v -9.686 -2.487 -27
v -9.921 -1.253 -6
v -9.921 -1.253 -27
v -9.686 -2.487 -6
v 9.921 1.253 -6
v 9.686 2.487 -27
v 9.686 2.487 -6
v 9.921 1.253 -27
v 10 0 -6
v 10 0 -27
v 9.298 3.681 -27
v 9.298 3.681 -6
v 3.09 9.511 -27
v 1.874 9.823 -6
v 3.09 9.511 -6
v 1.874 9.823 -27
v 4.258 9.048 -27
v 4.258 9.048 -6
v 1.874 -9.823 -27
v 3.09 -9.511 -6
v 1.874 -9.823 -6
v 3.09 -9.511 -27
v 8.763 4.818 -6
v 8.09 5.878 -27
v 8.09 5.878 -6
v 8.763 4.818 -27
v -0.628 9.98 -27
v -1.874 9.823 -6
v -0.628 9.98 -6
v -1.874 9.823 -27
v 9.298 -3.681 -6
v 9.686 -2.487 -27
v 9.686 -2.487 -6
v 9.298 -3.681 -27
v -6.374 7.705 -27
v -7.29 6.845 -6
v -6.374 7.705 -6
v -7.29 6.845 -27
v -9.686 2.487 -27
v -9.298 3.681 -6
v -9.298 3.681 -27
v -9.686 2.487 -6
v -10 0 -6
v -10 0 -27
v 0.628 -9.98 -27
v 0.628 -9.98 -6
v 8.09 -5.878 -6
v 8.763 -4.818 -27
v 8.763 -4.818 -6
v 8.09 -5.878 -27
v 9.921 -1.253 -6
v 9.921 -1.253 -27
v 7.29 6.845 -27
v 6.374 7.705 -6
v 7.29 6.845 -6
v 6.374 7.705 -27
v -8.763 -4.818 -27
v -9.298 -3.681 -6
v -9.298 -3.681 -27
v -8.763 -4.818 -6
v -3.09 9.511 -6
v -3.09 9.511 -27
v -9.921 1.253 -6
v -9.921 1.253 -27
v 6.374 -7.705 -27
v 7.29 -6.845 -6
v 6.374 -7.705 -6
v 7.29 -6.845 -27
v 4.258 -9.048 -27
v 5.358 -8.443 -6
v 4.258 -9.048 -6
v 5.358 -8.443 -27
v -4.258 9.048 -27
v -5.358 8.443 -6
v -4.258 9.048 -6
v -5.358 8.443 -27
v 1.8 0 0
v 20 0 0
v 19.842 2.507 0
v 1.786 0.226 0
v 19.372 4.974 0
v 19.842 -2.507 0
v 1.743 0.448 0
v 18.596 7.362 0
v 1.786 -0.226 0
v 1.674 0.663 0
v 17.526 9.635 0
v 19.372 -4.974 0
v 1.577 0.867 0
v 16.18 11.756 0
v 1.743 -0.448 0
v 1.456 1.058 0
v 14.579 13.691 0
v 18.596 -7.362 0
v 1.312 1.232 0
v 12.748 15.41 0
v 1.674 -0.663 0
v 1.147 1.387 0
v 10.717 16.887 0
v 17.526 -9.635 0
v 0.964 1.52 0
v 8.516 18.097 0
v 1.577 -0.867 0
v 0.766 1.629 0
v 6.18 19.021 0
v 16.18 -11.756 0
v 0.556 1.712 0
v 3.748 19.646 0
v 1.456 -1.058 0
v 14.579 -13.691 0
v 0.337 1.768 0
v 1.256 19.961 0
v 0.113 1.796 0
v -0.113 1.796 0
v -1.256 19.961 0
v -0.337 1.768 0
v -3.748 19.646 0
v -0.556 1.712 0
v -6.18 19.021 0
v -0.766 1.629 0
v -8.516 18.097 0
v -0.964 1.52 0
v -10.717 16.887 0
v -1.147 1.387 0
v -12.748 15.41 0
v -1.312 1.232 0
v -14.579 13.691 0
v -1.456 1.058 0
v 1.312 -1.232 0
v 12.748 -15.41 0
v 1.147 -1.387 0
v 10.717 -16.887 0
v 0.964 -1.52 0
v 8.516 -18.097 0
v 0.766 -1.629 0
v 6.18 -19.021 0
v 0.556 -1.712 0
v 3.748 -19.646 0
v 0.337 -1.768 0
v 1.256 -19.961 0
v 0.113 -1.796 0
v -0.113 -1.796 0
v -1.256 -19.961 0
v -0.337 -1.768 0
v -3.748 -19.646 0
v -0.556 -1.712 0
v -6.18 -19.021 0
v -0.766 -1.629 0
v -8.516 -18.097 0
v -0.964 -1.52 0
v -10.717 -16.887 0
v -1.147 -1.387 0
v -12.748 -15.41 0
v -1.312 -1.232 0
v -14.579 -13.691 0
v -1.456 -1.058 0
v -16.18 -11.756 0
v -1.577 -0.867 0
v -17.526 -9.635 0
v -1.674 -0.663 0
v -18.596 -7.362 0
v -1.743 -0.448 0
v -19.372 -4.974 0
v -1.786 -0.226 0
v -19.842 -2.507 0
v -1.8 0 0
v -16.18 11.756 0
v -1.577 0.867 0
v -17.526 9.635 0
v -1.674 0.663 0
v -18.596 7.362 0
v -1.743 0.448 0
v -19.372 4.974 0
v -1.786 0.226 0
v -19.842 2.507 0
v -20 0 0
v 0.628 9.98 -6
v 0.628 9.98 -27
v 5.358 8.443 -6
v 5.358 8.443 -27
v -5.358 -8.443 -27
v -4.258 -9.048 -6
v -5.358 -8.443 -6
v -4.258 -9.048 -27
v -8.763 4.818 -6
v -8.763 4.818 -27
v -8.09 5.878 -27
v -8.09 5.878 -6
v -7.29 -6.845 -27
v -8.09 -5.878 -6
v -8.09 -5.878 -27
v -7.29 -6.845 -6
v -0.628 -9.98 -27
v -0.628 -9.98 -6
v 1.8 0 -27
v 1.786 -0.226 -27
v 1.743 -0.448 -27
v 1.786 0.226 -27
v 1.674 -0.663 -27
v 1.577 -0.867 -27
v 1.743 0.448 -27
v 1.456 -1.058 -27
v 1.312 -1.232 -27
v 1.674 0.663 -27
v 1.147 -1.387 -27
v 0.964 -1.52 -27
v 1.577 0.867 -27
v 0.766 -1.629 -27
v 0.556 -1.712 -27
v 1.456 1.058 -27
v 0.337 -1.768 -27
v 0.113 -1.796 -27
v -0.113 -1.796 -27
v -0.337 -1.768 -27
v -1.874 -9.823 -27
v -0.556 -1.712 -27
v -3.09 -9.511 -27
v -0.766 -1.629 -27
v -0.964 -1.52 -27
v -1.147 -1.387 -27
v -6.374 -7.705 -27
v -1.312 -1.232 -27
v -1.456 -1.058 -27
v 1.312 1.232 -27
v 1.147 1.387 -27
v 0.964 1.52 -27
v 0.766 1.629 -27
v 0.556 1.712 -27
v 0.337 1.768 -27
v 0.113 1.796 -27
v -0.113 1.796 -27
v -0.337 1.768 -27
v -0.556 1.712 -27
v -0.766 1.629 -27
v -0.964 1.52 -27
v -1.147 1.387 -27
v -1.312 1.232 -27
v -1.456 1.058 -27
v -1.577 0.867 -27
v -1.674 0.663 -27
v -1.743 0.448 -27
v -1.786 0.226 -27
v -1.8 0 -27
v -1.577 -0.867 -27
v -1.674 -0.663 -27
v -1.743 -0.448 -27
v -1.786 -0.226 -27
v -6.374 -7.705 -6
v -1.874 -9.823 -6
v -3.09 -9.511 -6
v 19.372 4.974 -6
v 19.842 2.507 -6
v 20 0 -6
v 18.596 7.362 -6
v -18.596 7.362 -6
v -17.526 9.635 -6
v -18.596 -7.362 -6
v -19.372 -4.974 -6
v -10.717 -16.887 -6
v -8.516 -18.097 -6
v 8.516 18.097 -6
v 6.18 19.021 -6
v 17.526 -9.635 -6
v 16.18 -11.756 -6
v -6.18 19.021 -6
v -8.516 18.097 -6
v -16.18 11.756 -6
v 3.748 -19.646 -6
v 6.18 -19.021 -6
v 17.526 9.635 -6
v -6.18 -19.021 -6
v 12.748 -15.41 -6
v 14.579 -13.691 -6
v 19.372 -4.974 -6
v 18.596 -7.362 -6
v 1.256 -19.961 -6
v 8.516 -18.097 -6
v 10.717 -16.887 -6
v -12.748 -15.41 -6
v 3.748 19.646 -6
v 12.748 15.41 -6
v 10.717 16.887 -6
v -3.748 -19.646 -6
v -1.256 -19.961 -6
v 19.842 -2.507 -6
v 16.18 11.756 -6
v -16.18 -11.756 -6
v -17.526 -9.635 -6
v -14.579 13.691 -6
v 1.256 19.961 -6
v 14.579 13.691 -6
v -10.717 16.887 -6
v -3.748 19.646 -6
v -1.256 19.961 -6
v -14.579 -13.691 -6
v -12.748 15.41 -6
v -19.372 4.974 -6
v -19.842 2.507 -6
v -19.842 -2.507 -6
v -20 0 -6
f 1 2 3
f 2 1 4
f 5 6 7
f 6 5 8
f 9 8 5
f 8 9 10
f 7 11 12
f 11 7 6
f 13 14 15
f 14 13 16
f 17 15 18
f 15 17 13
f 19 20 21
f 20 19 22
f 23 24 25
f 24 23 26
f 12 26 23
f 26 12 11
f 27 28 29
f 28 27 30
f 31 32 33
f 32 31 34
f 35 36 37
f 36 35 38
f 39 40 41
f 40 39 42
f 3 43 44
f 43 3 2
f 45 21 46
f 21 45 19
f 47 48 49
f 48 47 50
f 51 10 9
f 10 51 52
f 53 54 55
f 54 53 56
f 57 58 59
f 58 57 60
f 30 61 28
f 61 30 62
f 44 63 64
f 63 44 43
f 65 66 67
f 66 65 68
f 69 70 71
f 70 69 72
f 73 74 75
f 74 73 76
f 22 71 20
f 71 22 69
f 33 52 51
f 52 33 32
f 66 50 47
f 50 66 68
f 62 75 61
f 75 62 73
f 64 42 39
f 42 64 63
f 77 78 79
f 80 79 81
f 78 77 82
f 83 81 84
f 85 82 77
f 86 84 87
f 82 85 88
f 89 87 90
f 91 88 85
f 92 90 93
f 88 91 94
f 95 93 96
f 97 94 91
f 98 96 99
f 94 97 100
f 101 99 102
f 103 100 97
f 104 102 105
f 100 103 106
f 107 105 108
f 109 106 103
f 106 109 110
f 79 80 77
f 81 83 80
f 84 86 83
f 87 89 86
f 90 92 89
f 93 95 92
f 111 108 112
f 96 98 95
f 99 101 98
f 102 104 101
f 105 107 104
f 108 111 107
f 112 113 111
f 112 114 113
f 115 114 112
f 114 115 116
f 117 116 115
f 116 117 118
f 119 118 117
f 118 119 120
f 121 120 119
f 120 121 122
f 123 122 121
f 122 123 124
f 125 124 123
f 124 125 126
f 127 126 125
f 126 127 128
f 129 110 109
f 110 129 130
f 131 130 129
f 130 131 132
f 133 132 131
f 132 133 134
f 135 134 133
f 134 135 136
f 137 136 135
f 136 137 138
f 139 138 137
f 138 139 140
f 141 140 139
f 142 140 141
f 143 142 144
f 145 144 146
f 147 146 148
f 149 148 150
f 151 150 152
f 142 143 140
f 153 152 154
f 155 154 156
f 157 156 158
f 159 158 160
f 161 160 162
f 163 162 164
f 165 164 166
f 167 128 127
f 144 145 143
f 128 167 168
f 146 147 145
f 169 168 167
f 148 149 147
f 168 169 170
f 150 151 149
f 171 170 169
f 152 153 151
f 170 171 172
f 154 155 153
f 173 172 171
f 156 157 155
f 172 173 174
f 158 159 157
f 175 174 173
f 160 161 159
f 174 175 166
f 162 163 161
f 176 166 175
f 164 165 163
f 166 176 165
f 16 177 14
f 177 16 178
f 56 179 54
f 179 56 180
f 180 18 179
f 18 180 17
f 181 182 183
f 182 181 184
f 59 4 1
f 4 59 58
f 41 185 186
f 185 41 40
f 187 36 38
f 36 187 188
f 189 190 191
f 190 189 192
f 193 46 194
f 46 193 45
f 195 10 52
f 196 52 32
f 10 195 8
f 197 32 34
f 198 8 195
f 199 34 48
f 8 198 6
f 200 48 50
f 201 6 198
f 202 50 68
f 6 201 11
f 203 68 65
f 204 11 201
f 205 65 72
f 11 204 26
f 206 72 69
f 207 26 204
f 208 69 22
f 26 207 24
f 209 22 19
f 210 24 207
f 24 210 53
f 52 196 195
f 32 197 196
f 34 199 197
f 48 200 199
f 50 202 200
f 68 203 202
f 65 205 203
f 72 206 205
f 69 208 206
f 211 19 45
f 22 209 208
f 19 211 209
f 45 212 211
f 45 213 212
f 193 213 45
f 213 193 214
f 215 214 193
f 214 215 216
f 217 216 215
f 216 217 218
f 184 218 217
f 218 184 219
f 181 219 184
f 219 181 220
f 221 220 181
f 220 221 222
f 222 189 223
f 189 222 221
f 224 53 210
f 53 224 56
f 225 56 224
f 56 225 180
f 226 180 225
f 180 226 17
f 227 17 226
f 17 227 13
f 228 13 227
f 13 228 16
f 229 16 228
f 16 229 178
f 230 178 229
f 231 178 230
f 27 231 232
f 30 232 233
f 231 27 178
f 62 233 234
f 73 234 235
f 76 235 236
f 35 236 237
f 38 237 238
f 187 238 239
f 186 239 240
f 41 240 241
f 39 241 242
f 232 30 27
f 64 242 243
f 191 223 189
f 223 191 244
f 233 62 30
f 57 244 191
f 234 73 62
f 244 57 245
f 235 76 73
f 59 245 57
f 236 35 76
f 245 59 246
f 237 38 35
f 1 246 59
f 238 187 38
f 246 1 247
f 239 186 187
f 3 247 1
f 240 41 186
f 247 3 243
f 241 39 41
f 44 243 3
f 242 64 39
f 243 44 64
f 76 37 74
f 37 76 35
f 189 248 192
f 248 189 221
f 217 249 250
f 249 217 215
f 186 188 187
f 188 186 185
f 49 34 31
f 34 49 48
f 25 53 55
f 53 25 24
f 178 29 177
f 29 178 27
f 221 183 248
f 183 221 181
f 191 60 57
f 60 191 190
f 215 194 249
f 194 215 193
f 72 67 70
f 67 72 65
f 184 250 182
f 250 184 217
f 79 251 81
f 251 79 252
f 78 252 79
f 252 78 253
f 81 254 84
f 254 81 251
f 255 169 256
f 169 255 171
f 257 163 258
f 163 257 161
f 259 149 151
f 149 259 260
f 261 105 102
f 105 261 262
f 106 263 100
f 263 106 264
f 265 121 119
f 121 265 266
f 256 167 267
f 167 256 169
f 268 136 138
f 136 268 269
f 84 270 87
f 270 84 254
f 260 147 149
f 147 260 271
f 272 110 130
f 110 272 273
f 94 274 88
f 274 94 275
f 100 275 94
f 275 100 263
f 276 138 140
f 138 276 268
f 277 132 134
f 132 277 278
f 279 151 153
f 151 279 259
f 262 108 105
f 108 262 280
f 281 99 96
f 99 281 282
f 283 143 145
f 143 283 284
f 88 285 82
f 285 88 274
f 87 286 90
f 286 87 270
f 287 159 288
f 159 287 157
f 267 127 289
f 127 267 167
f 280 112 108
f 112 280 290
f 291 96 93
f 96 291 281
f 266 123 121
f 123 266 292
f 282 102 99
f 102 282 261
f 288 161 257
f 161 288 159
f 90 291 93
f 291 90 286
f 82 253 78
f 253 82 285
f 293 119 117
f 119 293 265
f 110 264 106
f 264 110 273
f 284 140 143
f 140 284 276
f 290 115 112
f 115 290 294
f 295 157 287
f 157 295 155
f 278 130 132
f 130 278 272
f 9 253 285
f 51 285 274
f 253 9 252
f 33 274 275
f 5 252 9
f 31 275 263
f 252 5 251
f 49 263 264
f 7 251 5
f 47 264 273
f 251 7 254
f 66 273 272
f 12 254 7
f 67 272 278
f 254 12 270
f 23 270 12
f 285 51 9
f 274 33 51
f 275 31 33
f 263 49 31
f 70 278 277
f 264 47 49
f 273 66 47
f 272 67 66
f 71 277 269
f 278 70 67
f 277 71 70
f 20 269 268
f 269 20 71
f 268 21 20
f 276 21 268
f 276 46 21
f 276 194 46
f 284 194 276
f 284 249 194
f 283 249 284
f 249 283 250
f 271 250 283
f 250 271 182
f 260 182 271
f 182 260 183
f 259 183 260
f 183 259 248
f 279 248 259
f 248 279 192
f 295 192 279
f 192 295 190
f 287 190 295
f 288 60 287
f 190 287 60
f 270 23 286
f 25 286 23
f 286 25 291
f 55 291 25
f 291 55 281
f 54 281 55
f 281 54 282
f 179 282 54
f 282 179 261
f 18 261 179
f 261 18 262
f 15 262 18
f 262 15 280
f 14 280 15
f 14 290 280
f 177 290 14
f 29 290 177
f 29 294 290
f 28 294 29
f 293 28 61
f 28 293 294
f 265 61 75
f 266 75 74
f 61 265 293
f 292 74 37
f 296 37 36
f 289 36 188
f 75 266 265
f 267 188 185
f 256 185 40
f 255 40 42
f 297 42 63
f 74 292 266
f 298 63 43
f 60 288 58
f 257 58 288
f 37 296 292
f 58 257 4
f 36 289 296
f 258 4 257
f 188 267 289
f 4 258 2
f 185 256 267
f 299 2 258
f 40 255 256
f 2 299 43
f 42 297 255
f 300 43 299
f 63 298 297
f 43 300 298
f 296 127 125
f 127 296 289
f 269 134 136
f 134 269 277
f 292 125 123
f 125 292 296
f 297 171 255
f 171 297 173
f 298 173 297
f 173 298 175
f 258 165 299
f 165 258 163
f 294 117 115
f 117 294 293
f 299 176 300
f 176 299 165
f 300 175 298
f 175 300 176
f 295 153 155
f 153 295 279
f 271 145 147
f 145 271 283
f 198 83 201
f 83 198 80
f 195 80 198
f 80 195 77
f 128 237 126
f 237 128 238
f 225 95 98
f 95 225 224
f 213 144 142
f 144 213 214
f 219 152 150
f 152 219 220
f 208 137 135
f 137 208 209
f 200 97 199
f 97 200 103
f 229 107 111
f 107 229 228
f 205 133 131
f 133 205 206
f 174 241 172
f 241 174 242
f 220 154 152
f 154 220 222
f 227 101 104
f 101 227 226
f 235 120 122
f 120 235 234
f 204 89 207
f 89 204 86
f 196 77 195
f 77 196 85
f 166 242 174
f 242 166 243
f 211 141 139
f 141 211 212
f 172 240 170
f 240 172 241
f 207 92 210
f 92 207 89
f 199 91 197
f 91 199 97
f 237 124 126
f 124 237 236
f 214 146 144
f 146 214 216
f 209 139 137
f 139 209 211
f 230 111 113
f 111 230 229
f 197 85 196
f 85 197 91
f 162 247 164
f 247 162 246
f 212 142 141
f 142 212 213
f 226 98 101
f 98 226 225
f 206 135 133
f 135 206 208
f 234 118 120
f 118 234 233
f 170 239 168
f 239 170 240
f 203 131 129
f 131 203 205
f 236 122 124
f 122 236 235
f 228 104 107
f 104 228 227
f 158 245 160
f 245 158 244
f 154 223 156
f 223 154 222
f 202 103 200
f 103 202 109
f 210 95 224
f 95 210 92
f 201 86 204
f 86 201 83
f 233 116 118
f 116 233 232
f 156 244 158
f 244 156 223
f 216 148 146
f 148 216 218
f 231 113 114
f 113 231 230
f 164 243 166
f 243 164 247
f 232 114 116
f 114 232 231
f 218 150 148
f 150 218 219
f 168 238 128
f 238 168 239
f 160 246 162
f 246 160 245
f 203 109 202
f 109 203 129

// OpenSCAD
$fn = 50;


difference() {
	union() {
		translate(v = [0, 0, -27.0000000000]) {
			cylinder(h = 27, r = 10.0000000000);
		}
		translate(v = [0, 0, -6.0000000000]) {
			cylinder(h = 6, r = 20.0000000000);
		}
	}
	union() {
		#translate(v = [0, 0, -27]) {
			cylinder(h = 27, r = 1.8000000000);
		}
	}
}
